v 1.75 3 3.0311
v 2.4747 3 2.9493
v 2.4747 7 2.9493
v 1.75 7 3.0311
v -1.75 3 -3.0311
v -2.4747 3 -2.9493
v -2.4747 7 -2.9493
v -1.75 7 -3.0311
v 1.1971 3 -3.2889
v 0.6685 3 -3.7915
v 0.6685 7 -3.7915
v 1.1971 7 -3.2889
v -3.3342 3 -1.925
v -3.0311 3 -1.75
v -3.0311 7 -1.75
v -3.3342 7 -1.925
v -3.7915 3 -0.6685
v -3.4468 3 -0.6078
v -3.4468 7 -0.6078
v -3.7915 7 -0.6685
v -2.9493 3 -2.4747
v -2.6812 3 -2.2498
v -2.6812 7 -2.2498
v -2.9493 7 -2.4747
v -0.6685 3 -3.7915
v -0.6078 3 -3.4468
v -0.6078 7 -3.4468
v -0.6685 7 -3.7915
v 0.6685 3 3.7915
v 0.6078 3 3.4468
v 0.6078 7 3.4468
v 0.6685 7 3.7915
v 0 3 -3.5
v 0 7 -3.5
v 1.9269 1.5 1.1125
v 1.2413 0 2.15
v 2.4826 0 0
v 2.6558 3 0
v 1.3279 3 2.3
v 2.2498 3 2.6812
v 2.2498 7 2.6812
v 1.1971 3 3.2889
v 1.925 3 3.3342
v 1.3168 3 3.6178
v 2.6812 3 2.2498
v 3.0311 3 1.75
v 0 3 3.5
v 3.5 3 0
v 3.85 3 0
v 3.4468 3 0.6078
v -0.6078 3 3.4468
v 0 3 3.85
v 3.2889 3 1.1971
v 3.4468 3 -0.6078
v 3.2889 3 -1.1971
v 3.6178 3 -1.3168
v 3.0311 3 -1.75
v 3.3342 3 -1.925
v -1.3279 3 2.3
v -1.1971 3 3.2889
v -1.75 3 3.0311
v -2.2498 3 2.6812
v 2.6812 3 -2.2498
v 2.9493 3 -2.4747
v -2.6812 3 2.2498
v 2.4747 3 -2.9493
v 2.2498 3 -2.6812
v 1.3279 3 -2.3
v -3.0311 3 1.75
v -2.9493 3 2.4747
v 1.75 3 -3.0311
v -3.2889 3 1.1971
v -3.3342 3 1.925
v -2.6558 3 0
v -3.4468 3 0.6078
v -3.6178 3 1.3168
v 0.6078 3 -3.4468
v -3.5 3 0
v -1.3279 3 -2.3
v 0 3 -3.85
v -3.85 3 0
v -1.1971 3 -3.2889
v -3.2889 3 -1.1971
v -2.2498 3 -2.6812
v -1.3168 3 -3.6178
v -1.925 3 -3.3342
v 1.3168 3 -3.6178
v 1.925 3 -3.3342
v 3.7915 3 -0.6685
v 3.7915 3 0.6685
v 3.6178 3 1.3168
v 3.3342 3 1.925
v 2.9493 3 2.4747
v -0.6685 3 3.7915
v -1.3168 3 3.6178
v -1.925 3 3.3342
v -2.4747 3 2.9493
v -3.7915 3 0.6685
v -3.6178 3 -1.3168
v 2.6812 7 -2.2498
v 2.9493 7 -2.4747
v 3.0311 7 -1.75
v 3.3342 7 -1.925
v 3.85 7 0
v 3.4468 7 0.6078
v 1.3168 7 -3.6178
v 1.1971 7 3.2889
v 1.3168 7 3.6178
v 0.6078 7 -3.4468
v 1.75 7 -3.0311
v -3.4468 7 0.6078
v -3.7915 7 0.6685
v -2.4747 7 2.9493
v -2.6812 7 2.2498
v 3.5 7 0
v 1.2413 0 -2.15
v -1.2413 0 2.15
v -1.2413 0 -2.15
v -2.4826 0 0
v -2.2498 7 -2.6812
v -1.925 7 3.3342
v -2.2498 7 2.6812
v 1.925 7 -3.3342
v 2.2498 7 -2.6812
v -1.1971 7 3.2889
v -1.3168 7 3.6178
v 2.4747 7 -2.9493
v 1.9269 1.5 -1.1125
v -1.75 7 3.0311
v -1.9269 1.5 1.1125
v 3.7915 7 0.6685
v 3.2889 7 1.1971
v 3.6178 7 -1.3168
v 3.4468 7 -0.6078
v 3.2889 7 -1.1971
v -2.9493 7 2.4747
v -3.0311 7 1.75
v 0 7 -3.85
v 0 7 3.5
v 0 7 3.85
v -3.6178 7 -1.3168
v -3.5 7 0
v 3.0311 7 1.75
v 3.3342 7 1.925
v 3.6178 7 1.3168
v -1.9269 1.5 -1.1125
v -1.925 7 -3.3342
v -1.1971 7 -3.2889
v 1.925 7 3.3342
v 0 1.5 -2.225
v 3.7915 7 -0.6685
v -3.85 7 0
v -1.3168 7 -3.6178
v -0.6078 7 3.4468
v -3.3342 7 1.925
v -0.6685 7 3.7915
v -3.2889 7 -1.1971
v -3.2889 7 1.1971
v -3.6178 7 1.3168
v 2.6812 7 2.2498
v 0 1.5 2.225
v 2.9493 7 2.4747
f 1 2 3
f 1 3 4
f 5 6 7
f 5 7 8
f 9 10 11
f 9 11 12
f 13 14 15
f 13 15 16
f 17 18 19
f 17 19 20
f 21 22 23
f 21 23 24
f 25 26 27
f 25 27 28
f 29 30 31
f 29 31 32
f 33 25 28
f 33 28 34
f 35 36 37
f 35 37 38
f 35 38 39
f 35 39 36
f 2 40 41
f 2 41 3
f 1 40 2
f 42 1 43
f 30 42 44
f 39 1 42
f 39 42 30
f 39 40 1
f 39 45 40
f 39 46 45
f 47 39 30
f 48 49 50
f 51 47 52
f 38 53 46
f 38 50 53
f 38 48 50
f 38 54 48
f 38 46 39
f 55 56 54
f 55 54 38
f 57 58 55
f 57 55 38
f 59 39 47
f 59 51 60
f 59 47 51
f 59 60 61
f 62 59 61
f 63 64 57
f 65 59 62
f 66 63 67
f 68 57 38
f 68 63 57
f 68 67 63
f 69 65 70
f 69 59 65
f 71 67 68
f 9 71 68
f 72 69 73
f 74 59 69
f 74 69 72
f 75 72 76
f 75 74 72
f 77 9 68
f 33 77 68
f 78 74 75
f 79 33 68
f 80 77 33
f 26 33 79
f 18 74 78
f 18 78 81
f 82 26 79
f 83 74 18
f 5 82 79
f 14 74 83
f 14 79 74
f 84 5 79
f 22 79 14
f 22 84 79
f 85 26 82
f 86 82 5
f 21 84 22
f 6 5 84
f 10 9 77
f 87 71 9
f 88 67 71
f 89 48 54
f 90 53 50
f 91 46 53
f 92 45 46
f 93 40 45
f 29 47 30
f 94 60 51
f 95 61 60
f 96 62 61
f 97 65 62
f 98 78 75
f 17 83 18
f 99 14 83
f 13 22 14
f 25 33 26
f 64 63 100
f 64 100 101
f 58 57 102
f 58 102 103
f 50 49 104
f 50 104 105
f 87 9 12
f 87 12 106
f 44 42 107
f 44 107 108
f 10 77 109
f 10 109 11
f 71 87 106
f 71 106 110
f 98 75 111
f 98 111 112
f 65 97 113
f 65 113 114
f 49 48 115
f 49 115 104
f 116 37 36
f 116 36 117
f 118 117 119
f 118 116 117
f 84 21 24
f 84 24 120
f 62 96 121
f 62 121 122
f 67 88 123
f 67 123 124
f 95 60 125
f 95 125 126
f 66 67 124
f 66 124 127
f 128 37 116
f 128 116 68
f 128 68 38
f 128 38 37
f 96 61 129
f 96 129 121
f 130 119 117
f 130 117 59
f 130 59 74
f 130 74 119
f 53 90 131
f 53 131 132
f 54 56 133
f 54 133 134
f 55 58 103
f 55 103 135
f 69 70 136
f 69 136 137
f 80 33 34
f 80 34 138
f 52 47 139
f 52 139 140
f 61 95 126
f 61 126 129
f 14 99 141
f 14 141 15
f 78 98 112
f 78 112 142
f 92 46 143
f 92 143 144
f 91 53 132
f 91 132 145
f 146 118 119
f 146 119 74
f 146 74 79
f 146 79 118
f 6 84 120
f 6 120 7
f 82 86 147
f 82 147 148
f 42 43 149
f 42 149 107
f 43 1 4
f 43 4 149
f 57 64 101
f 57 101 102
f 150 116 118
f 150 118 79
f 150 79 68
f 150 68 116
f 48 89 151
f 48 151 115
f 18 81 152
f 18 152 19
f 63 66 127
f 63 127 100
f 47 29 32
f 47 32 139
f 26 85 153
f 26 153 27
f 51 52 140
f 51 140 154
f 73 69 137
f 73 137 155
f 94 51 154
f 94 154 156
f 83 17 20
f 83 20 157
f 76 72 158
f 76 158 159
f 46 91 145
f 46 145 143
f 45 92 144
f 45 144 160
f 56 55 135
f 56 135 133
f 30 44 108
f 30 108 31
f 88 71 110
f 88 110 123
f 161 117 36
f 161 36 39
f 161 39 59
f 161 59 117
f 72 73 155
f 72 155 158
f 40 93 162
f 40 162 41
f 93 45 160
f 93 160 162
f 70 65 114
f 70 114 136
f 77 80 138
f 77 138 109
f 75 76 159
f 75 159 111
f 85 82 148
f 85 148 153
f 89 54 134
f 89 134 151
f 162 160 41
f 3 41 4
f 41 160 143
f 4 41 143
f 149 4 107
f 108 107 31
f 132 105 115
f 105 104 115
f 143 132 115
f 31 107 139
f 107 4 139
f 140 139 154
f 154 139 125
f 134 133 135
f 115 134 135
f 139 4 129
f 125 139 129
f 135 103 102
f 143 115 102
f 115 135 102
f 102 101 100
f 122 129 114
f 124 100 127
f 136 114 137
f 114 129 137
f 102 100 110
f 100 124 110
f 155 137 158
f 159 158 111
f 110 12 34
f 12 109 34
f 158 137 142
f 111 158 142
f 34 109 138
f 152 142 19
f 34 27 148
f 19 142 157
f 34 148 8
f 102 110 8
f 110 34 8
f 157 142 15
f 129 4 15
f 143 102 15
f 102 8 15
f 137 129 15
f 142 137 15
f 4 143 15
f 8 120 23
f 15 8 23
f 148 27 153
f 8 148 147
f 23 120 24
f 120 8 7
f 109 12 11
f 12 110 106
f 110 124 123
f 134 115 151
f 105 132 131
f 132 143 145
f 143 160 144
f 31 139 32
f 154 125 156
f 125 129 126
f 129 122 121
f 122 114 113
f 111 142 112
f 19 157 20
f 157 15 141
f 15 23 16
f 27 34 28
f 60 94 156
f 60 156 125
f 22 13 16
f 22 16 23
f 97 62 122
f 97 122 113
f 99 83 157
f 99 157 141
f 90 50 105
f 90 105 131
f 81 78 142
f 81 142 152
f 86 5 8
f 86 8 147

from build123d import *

# Parameters (mm, degrees)
BOSS_EXTRUDE1_DEPTH = 4


with BuildPart() as part:
    # Sketch1 → Loft1 section 0
    with BuildSketch(Plane(origin=(0, 0, 0), x_dir=(1, 0, 0), z_dir=(0, 1, 0))):
        with BuildLine():
            Line((2.482606158, 0), (1.241303079, 2.15))
            Line((1.241303079, 2.15), (-1.241303079, 2.15))
            Line((-1.241303079, 2.15), (-2.482606158, 0))
            Line((-2.482606158, 0), (-1.241303079, -2.15))
            Line((-1.241303079, -2.15), (1.241303079, -2.15))
            Line((1.241303079, -2.15), (2.482606158, 0))
        make_face()
    # Sketch2 → Loft1 section 1
    with BuildSketch(Plane(origin=(0, 3, 0), x_dir=(1, 0, 0), z_dir=(0, 1, 0))):
        with BuildLine():
            Line((2.655811238, 0), (1.327905619, 2.3))
            Line((1.327905619, 2.3), (-1.327905619, 2.3))
            Line((-1.327905619, 2.3), (-2.655811238, 0))
            Line((-2.655811238, 0), (-1.327905619, -2.3))
            Line((-1.327905619, -2.3), (1.327905619, -2.3))
            Line((1.327905619, -2.3), (2.655811238, 0))
        make_face()
    loft()

    # Sketch3 → Boss-Extrude1 (add)
    with BuildSketch(Plane(origin=(0, 3, 0), x_dir=(1, 0, 0), z_dir=(0, 1, 0))):
        Polygon((0, 3.5), (0, 3.85), (0.607768622, 3.446827136), (0.668545484, 3.791509849), (1.197070502, 3.288924173), (1.316777552, 3.61781659), (1.75, 3.031088913), (1.925, 3.334197805), (2.249756634, 2.681155551), (2.474732297, 2.949271106), (2.681155551, 2.249756634), (2.949271106, 2.474732297), (3.031088913, 1.75), (3.334197805, 1.925), (3.288924173, 1.197070502), (3.61781659, 1.316777552), (3.446827136, 0.607768622), (3.791509849, 0.668545484), (3.5, 0), (3.85, 0), (3.446827136, -0.607768622), (3.791509849, -0.668545484), (3.288924173, -1.197070502), (3.61781659, -1.316777552), (3.031088913, -1.75), (3.334197805, -1.925), (2.681155551, -2.249756634), (2.949271106, -2.474732297), (2.249756634, -2.681155551), (2.474732297, -2.949271106), (1.75, -3.031088913), (1.925, -3.334197805), (1.197070502, -3.288924173), (1.316777552, -3.61781659), (0.607768622, -3.446827136), (0.668545484, -3.791509849), (0, -3.5), (0, -3.85), (-0.607768622, -3.446827136), (-0.668545484, -3.791509849), (-1.197070502, -3.288924173), (-1.316777552, -3.61781659), (-1.75, -3.031088913), (-1.925, -3.334197805), (-2.249756634, -2.681155551), (-2.474732297, -2.949271106), (-2.681155551, -2.249756634), (-2.949271106, -2.474732297), (-3.031088913, -1.75), (-3.334197805, -1.925), (-3.288924173, -1.197070502), (-3.61781659, -1.316777552), (-3.446827136, -0.607768622), (-3.791509849, -0.668545484), (-3.5, 0), (-3.85, 0), (-3.446827136, 0.607768622), (-3.791509849, 0.668545484), (-3.288924173, 1.197070502), (-3.61781659, 1.316777552), (-3.031088913, 1.75), (-3.334197805, 1.925), (-2.681155551, 2.249756634), (-2.949271106, 2.474732297), (-2.249756634, 2.681155551), (-2.474732297, 2.949271106), (-1.75, 3.031088913), (-1.925, 3.334197805), (-1.197070502, 3.288924173), (-1.316777552, 3.61781659), (-0.607768622, 3.446827136), (-0.668545484, 3.791509849), align=None)
    extrude(amount=BOSS_EXTRUDE1_DEPTH)


solid = part.part
